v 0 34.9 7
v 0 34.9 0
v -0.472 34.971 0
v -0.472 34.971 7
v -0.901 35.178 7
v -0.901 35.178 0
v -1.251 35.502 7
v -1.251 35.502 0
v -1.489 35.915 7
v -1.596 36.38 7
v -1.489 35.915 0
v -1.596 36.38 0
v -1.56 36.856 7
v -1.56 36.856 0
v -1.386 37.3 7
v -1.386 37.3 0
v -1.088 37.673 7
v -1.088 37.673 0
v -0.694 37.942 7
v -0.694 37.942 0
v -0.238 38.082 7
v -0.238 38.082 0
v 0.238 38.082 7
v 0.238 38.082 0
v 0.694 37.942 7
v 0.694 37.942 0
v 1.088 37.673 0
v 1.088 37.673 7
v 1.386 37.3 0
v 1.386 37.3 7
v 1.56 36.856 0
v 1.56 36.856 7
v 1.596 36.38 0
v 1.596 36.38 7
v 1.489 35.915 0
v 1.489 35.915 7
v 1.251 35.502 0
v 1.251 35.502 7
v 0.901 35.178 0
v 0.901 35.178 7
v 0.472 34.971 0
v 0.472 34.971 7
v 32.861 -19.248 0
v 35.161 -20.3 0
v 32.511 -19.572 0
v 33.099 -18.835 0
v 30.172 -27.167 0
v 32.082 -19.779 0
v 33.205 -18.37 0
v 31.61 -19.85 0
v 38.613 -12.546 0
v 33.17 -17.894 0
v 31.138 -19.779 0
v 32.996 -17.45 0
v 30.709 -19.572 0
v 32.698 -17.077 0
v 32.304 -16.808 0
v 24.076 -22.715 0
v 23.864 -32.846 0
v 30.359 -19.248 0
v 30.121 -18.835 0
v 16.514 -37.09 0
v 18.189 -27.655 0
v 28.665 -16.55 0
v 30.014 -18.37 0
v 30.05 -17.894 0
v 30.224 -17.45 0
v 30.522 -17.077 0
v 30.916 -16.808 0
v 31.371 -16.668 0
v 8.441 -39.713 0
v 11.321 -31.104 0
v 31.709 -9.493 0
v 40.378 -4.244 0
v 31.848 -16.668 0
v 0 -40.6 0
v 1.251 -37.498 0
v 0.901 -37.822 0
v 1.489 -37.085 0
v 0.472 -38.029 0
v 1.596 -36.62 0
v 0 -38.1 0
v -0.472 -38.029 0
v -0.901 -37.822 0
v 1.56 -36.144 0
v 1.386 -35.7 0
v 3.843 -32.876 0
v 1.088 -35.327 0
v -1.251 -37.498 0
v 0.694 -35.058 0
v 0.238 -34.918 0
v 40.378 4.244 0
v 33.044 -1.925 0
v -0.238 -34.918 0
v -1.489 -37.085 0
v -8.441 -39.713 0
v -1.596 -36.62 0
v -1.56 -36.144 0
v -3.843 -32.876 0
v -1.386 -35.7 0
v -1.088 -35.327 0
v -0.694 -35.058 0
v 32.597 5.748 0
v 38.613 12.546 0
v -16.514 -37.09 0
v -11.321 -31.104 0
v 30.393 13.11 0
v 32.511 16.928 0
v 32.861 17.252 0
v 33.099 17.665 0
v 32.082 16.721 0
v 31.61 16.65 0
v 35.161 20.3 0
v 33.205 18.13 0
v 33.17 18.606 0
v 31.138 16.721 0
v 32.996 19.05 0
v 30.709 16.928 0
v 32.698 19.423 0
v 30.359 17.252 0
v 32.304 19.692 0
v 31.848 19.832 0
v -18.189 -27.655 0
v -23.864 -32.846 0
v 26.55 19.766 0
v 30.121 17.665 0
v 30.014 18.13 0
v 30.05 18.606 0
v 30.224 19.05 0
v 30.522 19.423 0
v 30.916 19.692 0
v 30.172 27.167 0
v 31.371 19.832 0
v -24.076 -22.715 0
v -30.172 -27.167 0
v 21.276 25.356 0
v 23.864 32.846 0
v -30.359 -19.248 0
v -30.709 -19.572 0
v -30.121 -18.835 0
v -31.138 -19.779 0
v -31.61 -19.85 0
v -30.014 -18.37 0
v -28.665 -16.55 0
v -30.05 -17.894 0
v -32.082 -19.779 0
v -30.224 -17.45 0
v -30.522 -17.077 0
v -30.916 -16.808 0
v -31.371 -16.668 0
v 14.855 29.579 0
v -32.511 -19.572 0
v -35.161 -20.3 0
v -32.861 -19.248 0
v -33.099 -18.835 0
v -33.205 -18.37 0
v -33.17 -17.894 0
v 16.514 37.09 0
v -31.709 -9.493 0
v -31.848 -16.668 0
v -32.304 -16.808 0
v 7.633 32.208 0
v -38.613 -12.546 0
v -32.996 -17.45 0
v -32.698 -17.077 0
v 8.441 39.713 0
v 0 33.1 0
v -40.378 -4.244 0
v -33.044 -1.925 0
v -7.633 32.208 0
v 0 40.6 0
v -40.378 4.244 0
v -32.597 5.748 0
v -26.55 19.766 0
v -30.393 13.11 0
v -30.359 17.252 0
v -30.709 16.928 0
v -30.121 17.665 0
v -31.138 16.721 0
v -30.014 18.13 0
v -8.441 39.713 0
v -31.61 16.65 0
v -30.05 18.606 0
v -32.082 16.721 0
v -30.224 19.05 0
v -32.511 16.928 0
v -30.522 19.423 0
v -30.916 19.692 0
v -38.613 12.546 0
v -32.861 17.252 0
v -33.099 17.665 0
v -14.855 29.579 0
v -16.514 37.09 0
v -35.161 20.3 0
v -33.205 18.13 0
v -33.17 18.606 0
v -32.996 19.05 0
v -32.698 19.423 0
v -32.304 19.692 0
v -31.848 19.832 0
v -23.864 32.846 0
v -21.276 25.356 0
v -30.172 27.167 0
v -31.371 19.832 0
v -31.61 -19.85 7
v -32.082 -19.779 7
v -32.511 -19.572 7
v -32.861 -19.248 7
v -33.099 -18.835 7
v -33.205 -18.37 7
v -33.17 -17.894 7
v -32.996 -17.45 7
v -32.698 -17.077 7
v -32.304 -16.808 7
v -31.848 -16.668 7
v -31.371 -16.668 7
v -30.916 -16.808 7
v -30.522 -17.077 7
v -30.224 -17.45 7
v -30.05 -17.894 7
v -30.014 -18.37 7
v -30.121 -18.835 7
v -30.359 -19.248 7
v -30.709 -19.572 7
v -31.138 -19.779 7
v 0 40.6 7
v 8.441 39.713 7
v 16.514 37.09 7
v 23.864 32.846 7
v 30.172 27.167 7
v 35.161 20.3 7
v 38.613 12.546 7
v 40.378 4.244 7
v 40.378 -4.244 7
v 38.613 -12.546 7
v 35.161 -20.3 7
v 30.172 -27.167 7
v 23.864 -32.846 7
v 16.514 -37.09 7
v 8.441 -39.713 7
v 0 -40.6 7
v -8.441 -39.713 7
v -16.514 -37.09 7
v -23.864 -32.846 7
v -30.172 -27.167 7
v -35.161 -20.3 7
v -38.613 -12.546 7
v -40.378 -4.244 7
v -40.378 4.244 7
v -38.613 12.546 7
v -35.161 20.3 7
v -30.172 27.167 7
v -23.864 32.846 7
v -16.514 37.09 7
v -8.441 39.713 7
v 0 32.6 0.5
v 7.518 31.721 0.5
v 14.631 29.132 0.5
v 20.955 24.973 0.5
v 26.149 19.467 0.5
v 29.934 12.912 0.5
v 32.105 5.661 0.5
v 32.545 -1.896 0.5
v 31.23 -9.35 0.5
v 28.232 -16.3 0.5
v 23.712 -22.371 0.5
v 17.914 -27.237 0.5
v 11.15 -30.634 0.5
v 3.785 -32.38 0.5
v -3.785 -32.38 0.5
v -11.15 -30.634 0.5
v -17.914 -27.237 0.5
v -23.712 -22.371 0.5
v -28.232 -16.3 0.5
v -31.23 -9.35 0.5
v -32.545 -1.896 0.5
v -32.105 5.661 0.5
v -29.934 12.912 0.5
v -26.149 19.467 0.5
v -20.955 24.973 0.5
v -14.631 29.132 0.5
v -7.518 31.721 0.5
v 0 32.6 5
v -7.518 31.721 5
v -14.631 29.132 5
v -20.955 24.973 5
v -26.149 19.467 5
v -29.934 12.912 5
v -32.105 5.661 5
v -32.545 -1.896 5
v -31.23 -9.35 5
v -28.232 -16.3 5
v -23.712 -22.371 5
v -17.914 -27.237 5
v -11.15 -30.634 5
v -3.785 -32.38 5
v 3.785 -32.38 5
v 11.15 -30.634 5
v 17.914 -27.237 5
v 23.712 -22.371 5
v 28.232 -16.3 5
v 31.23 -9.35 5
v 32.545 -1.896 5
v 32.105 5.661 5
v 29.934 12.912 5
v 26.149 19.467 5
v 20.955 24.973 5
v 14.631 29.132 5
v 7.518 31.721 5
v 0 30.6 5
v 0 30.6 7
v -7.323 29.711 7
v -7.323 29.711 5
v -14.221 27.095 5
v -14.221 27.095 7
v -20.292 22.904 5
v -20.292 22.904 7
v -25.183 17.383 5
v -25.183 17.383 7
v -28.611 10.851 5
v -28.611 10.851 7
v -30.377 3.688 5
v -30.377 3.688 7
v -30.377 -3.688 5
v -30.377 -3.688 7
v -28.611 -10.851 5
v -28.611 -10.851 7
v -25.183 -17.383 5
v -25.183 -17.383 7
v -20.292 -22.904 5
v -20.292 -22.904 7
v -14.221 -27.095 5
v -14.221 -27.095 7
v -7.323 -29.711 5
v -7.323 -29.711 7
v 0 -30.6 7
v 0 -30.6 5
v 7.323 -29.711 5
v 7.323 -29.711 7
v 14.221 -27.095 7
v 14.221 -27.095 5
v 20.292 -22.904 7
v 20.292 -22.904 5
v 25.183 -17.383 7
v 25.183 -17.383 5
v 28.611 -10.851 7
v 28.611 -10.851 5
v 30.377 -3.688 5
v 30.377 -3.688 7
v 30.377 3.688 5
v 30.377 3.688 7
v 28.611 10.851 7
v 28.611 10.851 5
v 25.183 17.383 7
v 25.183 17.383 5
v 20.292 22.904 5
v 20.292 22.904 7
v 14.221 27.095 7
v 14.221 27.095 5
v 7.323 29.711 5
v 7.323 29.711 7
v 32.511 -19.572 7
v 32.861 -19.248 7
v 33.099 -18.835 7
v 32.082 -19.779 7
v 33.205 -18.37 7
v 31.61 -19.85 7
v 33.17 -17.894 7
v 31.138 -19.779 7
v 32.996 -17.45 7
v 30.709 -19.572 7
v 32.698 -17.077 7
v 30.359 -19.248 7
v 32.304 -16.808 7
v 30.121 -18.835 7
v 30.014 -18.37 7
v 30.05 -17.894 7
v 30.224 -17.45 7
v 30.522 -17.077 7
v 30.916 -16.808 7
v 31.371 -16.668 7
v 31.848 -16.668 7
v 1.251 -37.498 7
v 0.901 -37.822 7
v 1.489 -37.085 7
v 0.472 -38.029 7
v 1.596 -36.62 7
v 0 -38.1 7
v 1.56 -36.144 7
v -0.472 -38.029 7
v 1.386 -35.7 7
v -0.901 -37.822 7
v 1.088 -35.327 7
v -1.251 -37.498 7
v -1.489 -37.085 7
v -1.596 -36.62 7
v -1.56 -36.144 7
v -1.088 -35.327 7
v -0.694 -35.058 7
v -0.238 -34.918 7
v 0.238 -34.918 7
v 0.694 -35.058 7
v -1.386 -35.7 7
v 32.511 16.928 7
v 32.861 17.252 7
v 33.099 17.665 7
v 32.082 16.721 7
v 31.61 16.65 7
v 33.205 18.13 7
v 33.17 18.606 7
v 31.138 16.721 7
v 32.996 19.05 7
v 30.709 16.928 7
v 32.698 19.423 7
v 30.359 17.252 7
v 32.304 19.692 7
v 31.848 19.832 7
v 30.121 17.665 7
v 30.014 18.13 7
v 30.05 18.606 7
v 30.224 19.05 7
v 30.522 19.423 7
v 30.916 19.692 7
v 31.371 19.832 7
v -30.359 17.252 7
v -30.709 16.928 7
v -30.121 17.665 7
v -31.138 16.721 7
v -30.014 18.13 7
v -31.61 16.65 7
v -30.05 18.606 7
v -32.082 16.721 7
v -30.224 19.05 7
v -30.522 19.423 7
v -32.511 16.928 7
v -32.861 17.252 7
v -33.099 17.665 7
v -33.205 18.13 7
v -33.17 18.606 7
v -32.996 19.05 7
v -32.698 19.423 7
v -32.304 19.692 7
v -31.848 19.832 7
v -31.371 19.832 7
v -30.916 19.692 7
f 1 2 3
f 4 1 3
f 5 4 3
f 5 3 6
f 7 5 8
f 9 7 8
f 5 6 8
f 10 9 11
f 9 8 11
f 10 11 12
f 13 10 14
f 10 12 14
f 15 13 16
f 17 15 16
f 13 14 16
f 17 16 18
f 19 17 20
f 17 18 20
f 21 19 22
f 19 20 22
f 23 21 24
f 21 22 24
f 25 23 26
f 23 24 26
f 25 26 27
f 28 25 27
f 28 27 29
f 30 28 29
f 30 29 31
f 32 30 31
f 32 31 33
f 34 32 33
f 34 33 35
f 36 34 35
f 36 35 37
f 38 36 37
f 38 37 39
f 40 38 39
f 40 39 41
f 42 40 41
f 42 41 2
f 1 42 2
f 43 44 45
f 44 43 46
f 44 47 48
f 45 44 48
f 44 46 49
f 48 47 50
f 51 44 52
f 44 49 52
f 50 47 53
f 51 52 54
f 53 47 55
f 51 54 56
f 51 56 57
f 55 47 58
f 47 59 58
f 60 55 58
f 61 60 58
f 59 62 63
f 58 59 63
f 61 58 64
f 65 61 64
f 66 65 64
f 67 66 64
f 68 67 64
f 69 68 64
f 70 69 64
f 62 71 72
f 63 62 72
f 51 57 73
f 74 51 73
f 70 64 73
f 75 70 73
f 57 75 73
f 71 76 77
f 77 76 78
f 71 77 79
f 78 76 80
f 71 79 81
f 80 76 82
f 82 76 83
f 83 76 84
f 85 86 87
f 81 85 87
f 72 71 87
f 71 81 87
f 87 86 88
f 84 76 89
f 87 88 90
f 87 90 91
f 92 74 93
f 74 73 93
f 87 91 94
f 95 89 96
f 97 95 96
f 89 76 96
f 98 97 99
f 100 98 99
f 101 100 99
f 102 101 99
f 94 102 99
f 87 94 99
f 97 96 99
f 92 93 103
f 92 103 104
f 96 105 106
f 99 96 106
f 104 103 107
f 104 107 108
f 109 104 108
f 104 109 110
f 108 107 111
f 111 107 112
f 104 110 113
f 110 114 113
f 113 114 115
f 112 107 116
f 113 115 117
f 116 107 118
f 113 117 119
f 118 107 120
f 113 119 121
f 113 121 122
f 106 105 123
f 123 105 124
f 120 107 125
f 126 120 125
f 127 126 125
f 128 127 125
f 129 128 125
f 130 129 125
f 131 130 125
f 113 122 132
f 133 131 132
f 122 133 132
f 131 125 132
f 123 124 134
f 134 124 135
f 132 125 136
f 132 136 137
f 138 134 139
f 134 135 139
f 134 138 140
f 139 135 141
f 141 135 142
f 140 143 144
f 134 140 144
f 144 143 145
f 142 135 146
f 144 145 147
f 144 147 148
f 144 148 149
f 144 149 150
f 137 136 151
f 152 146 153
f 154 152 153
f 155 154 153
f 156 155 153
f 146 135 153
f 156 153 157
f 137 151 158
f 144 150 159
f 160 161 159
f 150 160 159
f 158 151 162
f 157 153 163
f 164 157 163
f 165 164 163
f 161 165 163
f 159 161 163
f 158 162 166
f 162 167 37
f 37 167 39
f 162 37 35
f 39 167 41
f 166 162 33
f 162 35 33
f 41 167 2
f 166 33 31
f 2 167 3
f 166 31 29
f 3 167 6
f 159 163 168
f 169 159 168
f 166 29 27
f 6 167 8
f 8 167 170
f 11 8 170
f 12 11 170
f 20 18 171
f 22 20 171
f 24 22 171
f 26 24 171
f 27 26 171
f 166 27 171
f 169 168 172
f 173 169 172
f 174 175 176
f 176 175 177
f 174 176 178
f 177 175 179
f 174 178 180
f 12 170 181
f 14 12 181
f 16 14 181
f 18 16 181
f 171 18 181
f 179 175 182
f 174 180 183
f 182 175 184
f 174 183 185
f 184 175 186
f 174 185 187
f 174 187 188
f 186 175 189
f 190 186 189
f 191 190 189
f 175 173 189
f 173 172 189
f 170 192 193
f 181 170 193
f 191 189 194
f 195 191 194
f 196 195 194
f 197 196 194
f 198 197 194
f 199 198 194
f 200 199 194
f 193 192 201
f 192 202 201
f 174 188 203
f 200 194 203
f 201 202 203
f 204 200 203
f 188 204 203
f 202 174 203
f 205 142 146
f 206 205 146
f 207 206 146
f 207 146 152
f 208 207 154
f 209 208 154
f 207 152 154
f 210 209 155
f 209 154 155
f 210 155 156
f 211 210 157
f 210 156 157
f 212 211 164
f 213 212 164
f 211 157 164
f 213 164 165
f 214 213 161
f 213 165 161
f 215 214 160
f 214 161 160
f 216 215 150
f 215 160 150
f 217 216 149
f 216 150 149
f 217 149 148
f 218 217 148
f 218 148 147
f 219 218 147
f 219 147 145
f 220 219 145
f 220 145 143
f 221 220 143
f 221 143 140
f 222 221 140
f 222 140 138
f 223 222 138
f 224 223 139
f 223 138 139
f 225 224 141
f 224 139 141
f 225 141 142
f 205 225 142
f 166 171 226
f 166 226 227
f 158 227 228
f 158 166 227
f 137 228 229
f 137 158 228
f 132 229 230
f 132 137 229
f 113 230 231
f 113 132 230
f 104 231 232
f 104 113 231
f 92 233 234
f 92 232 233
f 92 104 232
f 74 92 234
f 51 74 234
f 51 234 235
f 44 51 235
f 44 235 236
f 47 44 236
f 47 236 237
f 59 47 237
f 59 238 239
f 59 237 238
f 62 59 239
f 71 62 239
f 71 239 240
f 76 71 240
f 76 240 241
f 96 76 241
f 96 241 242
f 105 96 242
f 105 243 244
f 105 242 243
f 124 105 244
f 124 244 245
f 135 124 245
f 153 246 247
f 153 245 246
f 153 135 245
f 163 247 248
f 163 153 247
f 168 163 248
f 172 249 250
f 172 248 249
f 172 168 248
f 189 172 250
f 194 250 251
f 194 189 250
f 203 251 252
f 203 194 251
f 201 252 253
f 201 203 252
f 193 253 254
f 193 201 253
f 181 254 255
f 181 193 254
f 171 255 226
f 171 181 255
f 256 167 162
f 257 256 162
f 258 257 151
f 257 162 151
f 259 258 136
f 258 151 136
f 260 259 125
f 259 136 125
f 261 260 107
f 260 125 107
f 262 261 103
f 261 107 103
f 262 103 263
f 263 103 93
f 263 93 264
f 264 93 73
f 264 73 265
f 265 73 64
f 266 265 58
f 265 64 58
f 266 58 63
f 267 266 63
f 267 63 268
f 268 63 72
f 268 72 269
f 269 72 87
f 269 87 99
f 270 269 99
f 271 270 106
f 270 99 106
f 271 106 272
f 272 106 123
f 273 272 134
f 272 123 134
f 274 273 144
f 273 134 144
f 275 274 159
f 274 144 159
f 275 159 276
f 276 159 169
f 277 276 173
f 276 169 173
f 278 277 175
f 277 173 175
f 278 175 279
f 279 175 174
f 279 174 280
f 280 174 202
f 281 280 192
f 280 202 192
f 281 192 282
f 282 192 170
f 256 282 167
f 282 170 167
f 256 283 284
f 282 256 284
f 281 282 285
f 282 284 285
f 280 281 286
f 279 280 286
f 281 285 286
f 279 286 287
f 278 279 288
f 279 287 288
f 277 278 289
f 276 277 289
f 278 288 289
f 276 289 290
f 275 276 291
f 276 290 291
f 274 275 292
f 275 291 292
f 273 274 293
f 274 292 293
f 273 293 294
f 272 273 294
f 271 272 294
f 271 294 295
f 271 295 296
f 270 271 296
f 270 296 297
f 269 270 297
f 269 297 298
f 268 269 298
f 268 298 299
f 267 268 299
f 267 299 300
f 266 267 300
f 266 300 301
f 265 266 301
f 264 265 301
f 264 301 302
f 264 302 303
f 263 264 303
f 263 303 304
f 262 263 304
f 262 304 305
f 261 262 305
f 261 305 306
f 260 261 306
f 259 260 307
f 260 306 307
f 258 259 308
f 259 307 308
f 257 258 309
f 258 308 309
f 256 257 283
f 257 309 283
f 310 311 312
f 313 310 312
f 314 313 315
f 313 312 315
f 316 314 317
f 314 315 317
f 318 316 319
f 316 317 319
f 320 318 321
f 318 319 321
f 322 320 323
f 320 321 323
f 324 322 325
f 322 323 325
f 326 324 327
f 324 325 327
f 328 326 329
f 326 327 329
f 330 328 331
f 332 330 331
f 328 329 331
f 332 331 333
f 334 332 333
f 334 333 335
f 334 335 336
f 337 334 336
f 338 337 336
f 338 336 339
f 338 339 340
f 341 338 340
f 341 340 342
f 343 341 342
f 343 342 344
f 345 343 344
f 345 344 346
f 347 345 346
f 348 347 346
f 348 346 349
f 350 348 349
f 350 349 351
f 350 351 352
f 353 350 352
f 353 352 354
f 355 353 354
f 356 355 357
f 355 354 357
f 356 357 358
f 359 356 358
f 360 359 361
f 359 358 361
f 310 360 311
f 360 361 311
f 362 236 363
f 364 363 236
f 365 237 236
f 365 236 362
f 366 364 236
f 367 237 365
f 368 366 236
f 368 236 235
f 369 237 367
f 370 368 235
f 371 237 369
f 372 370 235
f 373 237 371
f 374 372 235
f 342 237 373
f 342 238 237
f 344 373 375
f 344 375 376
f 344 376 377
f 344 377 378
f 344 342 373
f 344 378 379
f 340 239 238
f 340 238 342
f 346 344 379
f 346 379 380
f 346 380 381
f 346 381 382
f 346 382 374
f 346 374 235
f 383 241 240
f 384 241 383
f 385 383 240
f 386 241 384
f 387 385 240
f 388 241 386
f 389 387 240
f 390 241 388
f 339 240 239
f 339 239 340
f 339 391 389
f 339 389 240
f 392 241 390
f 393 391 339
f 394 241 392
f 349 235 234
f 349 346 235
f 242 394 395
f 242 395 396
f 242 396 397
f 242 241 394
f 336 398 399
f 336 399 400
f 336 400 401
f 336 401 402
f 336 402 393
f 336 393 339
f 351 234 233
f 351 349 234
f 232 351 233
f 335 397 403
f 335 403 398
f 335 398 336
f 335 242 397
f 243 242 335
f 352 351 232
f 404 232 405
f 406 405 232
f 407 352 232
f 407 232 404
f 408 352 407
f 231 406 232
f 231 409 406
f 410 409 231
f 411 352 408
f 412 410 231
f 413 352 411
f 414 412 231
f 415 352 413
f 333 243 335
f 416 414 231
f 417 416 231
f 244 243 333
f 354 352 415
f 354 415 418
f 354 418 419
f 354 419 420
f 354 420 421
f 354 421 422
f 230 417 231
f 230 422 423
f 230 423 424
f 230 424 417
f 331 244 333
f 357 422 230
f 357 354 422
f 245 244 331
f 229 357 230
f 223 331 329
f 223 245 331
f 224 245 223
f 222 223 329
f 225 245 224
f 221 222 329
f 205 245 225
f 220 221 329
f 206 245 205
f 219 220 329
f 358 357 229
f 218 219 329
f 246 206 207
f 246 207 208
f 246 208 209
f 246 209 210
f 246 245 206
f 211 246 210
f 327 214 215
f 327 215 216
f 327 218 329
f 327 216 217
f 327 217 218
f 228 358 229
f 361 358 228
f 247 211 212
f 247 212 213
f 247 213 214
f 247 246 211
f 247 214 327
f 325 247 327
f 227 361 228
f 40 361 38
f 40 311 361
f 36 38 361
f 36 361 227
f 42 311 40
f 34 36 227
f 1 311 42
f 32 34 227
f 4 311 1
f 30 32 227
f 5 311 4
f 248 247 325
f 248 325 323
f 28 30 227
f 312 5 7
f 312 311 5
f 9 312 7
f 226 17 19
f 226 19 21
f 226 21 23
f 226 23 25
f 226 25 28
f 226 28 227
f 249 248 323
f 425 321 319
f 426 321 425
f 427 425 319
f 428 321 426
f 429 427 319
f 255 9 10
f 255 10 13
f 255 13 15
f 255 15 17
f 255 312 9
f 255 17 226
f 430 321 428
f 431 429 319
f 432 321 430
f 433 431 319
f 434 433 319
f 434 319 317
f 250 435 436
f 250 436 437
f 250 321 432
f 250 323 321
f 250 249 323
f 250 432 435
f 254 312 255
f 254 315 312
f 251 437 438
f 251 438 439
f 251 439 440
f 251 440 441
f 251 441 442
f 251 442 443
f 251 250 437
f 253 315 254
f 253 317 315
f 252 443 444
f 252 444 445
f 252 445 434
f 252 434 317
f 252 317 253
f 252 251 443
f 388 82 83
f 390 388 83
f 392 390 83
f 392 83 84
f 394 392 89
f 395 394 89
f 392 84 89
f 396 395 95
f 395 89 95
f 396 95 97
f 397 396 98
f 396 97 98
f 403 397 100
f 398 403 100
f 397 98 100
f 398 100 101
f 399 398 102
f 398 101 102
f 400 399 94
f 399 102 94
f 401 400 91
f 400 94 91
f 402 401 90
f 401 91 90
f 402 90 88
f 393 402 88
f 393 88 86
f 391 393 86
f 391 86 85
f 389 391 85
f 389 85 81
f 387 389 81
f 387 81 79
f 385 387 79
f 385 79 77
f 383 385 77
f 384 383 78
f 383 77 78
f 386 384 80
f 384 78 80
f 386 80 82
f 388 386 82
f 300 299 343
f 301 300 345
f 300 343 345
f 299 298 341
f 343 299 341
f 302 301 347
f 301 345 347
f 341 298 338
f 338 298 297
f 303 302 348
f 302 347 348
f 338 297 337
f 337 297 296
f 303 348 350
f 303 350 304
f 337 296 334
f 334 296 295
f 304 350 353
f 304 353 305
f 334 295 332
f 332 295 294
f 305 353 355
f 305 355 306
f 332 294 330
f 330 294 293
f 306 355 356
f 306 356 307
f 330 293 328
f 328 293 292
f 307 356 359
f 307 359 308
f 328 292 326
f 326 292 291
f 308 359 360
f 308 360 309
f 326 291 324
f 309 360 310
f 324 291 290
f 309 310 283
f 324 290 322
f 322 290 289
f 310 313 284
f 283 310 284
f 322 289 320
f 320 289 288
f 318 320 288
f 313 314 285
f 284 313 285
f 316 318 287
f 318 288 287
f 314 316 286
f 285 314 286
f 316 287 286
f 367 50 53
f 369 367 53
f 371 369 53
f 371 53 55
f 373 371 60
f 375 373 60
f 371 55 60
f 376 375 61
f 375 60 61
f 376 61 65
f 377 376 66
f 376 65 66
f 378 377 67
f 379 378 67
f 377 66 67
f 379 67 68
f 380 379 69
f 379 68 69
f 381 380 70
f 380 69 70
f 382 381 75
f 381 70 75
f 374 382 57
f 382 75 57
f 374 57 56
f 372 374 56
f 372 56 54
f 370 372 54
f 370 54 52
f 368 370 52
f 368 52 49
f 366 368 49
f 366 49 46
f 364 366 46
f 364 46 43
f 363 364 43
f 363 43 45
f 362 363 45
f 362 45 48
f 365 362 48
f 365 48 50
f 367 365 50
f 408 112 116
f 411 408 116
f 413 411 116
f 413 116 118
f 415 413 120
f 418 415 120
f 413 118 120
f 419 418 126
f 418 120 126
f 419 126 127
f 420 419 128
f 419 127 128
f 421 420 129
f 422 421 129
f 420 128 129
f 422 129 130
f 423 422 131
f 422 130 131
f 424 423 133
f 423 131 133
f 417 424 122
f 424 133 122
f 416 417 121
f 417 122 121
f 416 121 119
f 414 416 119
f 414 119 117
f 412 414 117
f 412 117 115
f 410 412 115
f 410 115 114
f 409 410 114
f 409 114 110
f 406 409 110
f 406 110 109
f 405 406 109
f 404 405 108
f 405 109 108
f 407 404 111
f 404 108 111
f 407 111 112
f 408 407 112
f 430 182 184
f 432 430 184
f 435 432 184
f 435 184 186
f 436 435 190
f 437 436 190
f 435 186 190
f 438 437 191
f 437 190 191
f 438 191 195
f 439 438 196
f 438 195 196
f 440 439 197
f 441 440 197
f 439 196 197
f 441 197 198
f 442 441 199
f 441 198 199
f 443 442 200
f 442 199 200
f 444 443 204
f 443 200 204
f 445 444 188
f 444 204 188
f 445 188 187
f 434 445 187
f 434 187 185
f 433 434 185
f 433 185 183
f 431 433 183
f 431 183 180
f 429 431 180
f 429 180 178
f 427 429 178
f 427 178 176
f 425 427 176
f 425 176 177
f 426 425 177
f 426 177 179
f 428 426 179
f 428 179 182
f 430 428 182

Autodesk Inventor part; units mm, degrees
ref_plane "YZ Plane" through (0, 0, 0) normal (1, 0, 0) x (0, 1, 0)
ref_plane "XZ Plane" through (0, 0, 0) normal (0, 1, 0) x (-1, 0, 0)
ref_plane "XY Plane" through (0, 0, 0) normal (0, 0, 1) x (1, 0, 0)
sketch "スケッチ1" plane through (0, 0, 0) normal (1, 0, 0) x (0, 1, 0)
  line L0 (32.6, 0) -> (32.6, 5)
  line L1 (32.6, 5) -> (30.6, 5)
  line L2 (30.6, 5) -> (30.6, 7)
  line L3 (30.6, 7) -> (40.6, 7)
  line L4 (40.6, 7) -> (40.6, 0)
  line L5 (40.6, 0) -> (32.6, 0)
  line L6 (0, -1.4) -> (0, 8.4) projected
  point P0 (0, 0)
  dimension "d0" = 32.6
  dimension "d1" = 5
  dimension "d2" = 2
  dimension "d3" = 2
  dimension "d22" = 8
revolve "回転1" add sketch "スケッチ1" angle 360 about axis through (0, 0, -10) along (0, 0, 1)
sketch "スケッチ2" plane through (0, 0, 7) normal (0, 0, 1) x (1, 0, 0)
  circle A0 centre (0, 0) radius 36.5
  point P0 (0, 36.5)
  point P1 (-31.6099, 18.25)
  point P2 (-31.6099, -18.25)
  point P3 (0, -36.5)
  point P4 (31.6099, -18.25)
  point P5 (31.6099, 18.25)
  dimension "d6" = 73
  dimension "d16" = 360
hole "穴1" at (31.6099, 18.25, 7) at (31.6099, -18.25, 7) at (0, -36.5, 7) at (-31.6099, -18.25, 7) at (-31.6099, 18.25, 7) at (0, 36.5, 7) direction (0, 0, -1) diameter 3.2 end through all clearance for "Socket Head Cap Screw" size "M3" standard "Ansi Metric M Profile"
chamfer "面取り1" distance 0.5 angle 45 1 edges at (0, -32.6, 0)
properties part number "base2" material "ABS プラスチック"
